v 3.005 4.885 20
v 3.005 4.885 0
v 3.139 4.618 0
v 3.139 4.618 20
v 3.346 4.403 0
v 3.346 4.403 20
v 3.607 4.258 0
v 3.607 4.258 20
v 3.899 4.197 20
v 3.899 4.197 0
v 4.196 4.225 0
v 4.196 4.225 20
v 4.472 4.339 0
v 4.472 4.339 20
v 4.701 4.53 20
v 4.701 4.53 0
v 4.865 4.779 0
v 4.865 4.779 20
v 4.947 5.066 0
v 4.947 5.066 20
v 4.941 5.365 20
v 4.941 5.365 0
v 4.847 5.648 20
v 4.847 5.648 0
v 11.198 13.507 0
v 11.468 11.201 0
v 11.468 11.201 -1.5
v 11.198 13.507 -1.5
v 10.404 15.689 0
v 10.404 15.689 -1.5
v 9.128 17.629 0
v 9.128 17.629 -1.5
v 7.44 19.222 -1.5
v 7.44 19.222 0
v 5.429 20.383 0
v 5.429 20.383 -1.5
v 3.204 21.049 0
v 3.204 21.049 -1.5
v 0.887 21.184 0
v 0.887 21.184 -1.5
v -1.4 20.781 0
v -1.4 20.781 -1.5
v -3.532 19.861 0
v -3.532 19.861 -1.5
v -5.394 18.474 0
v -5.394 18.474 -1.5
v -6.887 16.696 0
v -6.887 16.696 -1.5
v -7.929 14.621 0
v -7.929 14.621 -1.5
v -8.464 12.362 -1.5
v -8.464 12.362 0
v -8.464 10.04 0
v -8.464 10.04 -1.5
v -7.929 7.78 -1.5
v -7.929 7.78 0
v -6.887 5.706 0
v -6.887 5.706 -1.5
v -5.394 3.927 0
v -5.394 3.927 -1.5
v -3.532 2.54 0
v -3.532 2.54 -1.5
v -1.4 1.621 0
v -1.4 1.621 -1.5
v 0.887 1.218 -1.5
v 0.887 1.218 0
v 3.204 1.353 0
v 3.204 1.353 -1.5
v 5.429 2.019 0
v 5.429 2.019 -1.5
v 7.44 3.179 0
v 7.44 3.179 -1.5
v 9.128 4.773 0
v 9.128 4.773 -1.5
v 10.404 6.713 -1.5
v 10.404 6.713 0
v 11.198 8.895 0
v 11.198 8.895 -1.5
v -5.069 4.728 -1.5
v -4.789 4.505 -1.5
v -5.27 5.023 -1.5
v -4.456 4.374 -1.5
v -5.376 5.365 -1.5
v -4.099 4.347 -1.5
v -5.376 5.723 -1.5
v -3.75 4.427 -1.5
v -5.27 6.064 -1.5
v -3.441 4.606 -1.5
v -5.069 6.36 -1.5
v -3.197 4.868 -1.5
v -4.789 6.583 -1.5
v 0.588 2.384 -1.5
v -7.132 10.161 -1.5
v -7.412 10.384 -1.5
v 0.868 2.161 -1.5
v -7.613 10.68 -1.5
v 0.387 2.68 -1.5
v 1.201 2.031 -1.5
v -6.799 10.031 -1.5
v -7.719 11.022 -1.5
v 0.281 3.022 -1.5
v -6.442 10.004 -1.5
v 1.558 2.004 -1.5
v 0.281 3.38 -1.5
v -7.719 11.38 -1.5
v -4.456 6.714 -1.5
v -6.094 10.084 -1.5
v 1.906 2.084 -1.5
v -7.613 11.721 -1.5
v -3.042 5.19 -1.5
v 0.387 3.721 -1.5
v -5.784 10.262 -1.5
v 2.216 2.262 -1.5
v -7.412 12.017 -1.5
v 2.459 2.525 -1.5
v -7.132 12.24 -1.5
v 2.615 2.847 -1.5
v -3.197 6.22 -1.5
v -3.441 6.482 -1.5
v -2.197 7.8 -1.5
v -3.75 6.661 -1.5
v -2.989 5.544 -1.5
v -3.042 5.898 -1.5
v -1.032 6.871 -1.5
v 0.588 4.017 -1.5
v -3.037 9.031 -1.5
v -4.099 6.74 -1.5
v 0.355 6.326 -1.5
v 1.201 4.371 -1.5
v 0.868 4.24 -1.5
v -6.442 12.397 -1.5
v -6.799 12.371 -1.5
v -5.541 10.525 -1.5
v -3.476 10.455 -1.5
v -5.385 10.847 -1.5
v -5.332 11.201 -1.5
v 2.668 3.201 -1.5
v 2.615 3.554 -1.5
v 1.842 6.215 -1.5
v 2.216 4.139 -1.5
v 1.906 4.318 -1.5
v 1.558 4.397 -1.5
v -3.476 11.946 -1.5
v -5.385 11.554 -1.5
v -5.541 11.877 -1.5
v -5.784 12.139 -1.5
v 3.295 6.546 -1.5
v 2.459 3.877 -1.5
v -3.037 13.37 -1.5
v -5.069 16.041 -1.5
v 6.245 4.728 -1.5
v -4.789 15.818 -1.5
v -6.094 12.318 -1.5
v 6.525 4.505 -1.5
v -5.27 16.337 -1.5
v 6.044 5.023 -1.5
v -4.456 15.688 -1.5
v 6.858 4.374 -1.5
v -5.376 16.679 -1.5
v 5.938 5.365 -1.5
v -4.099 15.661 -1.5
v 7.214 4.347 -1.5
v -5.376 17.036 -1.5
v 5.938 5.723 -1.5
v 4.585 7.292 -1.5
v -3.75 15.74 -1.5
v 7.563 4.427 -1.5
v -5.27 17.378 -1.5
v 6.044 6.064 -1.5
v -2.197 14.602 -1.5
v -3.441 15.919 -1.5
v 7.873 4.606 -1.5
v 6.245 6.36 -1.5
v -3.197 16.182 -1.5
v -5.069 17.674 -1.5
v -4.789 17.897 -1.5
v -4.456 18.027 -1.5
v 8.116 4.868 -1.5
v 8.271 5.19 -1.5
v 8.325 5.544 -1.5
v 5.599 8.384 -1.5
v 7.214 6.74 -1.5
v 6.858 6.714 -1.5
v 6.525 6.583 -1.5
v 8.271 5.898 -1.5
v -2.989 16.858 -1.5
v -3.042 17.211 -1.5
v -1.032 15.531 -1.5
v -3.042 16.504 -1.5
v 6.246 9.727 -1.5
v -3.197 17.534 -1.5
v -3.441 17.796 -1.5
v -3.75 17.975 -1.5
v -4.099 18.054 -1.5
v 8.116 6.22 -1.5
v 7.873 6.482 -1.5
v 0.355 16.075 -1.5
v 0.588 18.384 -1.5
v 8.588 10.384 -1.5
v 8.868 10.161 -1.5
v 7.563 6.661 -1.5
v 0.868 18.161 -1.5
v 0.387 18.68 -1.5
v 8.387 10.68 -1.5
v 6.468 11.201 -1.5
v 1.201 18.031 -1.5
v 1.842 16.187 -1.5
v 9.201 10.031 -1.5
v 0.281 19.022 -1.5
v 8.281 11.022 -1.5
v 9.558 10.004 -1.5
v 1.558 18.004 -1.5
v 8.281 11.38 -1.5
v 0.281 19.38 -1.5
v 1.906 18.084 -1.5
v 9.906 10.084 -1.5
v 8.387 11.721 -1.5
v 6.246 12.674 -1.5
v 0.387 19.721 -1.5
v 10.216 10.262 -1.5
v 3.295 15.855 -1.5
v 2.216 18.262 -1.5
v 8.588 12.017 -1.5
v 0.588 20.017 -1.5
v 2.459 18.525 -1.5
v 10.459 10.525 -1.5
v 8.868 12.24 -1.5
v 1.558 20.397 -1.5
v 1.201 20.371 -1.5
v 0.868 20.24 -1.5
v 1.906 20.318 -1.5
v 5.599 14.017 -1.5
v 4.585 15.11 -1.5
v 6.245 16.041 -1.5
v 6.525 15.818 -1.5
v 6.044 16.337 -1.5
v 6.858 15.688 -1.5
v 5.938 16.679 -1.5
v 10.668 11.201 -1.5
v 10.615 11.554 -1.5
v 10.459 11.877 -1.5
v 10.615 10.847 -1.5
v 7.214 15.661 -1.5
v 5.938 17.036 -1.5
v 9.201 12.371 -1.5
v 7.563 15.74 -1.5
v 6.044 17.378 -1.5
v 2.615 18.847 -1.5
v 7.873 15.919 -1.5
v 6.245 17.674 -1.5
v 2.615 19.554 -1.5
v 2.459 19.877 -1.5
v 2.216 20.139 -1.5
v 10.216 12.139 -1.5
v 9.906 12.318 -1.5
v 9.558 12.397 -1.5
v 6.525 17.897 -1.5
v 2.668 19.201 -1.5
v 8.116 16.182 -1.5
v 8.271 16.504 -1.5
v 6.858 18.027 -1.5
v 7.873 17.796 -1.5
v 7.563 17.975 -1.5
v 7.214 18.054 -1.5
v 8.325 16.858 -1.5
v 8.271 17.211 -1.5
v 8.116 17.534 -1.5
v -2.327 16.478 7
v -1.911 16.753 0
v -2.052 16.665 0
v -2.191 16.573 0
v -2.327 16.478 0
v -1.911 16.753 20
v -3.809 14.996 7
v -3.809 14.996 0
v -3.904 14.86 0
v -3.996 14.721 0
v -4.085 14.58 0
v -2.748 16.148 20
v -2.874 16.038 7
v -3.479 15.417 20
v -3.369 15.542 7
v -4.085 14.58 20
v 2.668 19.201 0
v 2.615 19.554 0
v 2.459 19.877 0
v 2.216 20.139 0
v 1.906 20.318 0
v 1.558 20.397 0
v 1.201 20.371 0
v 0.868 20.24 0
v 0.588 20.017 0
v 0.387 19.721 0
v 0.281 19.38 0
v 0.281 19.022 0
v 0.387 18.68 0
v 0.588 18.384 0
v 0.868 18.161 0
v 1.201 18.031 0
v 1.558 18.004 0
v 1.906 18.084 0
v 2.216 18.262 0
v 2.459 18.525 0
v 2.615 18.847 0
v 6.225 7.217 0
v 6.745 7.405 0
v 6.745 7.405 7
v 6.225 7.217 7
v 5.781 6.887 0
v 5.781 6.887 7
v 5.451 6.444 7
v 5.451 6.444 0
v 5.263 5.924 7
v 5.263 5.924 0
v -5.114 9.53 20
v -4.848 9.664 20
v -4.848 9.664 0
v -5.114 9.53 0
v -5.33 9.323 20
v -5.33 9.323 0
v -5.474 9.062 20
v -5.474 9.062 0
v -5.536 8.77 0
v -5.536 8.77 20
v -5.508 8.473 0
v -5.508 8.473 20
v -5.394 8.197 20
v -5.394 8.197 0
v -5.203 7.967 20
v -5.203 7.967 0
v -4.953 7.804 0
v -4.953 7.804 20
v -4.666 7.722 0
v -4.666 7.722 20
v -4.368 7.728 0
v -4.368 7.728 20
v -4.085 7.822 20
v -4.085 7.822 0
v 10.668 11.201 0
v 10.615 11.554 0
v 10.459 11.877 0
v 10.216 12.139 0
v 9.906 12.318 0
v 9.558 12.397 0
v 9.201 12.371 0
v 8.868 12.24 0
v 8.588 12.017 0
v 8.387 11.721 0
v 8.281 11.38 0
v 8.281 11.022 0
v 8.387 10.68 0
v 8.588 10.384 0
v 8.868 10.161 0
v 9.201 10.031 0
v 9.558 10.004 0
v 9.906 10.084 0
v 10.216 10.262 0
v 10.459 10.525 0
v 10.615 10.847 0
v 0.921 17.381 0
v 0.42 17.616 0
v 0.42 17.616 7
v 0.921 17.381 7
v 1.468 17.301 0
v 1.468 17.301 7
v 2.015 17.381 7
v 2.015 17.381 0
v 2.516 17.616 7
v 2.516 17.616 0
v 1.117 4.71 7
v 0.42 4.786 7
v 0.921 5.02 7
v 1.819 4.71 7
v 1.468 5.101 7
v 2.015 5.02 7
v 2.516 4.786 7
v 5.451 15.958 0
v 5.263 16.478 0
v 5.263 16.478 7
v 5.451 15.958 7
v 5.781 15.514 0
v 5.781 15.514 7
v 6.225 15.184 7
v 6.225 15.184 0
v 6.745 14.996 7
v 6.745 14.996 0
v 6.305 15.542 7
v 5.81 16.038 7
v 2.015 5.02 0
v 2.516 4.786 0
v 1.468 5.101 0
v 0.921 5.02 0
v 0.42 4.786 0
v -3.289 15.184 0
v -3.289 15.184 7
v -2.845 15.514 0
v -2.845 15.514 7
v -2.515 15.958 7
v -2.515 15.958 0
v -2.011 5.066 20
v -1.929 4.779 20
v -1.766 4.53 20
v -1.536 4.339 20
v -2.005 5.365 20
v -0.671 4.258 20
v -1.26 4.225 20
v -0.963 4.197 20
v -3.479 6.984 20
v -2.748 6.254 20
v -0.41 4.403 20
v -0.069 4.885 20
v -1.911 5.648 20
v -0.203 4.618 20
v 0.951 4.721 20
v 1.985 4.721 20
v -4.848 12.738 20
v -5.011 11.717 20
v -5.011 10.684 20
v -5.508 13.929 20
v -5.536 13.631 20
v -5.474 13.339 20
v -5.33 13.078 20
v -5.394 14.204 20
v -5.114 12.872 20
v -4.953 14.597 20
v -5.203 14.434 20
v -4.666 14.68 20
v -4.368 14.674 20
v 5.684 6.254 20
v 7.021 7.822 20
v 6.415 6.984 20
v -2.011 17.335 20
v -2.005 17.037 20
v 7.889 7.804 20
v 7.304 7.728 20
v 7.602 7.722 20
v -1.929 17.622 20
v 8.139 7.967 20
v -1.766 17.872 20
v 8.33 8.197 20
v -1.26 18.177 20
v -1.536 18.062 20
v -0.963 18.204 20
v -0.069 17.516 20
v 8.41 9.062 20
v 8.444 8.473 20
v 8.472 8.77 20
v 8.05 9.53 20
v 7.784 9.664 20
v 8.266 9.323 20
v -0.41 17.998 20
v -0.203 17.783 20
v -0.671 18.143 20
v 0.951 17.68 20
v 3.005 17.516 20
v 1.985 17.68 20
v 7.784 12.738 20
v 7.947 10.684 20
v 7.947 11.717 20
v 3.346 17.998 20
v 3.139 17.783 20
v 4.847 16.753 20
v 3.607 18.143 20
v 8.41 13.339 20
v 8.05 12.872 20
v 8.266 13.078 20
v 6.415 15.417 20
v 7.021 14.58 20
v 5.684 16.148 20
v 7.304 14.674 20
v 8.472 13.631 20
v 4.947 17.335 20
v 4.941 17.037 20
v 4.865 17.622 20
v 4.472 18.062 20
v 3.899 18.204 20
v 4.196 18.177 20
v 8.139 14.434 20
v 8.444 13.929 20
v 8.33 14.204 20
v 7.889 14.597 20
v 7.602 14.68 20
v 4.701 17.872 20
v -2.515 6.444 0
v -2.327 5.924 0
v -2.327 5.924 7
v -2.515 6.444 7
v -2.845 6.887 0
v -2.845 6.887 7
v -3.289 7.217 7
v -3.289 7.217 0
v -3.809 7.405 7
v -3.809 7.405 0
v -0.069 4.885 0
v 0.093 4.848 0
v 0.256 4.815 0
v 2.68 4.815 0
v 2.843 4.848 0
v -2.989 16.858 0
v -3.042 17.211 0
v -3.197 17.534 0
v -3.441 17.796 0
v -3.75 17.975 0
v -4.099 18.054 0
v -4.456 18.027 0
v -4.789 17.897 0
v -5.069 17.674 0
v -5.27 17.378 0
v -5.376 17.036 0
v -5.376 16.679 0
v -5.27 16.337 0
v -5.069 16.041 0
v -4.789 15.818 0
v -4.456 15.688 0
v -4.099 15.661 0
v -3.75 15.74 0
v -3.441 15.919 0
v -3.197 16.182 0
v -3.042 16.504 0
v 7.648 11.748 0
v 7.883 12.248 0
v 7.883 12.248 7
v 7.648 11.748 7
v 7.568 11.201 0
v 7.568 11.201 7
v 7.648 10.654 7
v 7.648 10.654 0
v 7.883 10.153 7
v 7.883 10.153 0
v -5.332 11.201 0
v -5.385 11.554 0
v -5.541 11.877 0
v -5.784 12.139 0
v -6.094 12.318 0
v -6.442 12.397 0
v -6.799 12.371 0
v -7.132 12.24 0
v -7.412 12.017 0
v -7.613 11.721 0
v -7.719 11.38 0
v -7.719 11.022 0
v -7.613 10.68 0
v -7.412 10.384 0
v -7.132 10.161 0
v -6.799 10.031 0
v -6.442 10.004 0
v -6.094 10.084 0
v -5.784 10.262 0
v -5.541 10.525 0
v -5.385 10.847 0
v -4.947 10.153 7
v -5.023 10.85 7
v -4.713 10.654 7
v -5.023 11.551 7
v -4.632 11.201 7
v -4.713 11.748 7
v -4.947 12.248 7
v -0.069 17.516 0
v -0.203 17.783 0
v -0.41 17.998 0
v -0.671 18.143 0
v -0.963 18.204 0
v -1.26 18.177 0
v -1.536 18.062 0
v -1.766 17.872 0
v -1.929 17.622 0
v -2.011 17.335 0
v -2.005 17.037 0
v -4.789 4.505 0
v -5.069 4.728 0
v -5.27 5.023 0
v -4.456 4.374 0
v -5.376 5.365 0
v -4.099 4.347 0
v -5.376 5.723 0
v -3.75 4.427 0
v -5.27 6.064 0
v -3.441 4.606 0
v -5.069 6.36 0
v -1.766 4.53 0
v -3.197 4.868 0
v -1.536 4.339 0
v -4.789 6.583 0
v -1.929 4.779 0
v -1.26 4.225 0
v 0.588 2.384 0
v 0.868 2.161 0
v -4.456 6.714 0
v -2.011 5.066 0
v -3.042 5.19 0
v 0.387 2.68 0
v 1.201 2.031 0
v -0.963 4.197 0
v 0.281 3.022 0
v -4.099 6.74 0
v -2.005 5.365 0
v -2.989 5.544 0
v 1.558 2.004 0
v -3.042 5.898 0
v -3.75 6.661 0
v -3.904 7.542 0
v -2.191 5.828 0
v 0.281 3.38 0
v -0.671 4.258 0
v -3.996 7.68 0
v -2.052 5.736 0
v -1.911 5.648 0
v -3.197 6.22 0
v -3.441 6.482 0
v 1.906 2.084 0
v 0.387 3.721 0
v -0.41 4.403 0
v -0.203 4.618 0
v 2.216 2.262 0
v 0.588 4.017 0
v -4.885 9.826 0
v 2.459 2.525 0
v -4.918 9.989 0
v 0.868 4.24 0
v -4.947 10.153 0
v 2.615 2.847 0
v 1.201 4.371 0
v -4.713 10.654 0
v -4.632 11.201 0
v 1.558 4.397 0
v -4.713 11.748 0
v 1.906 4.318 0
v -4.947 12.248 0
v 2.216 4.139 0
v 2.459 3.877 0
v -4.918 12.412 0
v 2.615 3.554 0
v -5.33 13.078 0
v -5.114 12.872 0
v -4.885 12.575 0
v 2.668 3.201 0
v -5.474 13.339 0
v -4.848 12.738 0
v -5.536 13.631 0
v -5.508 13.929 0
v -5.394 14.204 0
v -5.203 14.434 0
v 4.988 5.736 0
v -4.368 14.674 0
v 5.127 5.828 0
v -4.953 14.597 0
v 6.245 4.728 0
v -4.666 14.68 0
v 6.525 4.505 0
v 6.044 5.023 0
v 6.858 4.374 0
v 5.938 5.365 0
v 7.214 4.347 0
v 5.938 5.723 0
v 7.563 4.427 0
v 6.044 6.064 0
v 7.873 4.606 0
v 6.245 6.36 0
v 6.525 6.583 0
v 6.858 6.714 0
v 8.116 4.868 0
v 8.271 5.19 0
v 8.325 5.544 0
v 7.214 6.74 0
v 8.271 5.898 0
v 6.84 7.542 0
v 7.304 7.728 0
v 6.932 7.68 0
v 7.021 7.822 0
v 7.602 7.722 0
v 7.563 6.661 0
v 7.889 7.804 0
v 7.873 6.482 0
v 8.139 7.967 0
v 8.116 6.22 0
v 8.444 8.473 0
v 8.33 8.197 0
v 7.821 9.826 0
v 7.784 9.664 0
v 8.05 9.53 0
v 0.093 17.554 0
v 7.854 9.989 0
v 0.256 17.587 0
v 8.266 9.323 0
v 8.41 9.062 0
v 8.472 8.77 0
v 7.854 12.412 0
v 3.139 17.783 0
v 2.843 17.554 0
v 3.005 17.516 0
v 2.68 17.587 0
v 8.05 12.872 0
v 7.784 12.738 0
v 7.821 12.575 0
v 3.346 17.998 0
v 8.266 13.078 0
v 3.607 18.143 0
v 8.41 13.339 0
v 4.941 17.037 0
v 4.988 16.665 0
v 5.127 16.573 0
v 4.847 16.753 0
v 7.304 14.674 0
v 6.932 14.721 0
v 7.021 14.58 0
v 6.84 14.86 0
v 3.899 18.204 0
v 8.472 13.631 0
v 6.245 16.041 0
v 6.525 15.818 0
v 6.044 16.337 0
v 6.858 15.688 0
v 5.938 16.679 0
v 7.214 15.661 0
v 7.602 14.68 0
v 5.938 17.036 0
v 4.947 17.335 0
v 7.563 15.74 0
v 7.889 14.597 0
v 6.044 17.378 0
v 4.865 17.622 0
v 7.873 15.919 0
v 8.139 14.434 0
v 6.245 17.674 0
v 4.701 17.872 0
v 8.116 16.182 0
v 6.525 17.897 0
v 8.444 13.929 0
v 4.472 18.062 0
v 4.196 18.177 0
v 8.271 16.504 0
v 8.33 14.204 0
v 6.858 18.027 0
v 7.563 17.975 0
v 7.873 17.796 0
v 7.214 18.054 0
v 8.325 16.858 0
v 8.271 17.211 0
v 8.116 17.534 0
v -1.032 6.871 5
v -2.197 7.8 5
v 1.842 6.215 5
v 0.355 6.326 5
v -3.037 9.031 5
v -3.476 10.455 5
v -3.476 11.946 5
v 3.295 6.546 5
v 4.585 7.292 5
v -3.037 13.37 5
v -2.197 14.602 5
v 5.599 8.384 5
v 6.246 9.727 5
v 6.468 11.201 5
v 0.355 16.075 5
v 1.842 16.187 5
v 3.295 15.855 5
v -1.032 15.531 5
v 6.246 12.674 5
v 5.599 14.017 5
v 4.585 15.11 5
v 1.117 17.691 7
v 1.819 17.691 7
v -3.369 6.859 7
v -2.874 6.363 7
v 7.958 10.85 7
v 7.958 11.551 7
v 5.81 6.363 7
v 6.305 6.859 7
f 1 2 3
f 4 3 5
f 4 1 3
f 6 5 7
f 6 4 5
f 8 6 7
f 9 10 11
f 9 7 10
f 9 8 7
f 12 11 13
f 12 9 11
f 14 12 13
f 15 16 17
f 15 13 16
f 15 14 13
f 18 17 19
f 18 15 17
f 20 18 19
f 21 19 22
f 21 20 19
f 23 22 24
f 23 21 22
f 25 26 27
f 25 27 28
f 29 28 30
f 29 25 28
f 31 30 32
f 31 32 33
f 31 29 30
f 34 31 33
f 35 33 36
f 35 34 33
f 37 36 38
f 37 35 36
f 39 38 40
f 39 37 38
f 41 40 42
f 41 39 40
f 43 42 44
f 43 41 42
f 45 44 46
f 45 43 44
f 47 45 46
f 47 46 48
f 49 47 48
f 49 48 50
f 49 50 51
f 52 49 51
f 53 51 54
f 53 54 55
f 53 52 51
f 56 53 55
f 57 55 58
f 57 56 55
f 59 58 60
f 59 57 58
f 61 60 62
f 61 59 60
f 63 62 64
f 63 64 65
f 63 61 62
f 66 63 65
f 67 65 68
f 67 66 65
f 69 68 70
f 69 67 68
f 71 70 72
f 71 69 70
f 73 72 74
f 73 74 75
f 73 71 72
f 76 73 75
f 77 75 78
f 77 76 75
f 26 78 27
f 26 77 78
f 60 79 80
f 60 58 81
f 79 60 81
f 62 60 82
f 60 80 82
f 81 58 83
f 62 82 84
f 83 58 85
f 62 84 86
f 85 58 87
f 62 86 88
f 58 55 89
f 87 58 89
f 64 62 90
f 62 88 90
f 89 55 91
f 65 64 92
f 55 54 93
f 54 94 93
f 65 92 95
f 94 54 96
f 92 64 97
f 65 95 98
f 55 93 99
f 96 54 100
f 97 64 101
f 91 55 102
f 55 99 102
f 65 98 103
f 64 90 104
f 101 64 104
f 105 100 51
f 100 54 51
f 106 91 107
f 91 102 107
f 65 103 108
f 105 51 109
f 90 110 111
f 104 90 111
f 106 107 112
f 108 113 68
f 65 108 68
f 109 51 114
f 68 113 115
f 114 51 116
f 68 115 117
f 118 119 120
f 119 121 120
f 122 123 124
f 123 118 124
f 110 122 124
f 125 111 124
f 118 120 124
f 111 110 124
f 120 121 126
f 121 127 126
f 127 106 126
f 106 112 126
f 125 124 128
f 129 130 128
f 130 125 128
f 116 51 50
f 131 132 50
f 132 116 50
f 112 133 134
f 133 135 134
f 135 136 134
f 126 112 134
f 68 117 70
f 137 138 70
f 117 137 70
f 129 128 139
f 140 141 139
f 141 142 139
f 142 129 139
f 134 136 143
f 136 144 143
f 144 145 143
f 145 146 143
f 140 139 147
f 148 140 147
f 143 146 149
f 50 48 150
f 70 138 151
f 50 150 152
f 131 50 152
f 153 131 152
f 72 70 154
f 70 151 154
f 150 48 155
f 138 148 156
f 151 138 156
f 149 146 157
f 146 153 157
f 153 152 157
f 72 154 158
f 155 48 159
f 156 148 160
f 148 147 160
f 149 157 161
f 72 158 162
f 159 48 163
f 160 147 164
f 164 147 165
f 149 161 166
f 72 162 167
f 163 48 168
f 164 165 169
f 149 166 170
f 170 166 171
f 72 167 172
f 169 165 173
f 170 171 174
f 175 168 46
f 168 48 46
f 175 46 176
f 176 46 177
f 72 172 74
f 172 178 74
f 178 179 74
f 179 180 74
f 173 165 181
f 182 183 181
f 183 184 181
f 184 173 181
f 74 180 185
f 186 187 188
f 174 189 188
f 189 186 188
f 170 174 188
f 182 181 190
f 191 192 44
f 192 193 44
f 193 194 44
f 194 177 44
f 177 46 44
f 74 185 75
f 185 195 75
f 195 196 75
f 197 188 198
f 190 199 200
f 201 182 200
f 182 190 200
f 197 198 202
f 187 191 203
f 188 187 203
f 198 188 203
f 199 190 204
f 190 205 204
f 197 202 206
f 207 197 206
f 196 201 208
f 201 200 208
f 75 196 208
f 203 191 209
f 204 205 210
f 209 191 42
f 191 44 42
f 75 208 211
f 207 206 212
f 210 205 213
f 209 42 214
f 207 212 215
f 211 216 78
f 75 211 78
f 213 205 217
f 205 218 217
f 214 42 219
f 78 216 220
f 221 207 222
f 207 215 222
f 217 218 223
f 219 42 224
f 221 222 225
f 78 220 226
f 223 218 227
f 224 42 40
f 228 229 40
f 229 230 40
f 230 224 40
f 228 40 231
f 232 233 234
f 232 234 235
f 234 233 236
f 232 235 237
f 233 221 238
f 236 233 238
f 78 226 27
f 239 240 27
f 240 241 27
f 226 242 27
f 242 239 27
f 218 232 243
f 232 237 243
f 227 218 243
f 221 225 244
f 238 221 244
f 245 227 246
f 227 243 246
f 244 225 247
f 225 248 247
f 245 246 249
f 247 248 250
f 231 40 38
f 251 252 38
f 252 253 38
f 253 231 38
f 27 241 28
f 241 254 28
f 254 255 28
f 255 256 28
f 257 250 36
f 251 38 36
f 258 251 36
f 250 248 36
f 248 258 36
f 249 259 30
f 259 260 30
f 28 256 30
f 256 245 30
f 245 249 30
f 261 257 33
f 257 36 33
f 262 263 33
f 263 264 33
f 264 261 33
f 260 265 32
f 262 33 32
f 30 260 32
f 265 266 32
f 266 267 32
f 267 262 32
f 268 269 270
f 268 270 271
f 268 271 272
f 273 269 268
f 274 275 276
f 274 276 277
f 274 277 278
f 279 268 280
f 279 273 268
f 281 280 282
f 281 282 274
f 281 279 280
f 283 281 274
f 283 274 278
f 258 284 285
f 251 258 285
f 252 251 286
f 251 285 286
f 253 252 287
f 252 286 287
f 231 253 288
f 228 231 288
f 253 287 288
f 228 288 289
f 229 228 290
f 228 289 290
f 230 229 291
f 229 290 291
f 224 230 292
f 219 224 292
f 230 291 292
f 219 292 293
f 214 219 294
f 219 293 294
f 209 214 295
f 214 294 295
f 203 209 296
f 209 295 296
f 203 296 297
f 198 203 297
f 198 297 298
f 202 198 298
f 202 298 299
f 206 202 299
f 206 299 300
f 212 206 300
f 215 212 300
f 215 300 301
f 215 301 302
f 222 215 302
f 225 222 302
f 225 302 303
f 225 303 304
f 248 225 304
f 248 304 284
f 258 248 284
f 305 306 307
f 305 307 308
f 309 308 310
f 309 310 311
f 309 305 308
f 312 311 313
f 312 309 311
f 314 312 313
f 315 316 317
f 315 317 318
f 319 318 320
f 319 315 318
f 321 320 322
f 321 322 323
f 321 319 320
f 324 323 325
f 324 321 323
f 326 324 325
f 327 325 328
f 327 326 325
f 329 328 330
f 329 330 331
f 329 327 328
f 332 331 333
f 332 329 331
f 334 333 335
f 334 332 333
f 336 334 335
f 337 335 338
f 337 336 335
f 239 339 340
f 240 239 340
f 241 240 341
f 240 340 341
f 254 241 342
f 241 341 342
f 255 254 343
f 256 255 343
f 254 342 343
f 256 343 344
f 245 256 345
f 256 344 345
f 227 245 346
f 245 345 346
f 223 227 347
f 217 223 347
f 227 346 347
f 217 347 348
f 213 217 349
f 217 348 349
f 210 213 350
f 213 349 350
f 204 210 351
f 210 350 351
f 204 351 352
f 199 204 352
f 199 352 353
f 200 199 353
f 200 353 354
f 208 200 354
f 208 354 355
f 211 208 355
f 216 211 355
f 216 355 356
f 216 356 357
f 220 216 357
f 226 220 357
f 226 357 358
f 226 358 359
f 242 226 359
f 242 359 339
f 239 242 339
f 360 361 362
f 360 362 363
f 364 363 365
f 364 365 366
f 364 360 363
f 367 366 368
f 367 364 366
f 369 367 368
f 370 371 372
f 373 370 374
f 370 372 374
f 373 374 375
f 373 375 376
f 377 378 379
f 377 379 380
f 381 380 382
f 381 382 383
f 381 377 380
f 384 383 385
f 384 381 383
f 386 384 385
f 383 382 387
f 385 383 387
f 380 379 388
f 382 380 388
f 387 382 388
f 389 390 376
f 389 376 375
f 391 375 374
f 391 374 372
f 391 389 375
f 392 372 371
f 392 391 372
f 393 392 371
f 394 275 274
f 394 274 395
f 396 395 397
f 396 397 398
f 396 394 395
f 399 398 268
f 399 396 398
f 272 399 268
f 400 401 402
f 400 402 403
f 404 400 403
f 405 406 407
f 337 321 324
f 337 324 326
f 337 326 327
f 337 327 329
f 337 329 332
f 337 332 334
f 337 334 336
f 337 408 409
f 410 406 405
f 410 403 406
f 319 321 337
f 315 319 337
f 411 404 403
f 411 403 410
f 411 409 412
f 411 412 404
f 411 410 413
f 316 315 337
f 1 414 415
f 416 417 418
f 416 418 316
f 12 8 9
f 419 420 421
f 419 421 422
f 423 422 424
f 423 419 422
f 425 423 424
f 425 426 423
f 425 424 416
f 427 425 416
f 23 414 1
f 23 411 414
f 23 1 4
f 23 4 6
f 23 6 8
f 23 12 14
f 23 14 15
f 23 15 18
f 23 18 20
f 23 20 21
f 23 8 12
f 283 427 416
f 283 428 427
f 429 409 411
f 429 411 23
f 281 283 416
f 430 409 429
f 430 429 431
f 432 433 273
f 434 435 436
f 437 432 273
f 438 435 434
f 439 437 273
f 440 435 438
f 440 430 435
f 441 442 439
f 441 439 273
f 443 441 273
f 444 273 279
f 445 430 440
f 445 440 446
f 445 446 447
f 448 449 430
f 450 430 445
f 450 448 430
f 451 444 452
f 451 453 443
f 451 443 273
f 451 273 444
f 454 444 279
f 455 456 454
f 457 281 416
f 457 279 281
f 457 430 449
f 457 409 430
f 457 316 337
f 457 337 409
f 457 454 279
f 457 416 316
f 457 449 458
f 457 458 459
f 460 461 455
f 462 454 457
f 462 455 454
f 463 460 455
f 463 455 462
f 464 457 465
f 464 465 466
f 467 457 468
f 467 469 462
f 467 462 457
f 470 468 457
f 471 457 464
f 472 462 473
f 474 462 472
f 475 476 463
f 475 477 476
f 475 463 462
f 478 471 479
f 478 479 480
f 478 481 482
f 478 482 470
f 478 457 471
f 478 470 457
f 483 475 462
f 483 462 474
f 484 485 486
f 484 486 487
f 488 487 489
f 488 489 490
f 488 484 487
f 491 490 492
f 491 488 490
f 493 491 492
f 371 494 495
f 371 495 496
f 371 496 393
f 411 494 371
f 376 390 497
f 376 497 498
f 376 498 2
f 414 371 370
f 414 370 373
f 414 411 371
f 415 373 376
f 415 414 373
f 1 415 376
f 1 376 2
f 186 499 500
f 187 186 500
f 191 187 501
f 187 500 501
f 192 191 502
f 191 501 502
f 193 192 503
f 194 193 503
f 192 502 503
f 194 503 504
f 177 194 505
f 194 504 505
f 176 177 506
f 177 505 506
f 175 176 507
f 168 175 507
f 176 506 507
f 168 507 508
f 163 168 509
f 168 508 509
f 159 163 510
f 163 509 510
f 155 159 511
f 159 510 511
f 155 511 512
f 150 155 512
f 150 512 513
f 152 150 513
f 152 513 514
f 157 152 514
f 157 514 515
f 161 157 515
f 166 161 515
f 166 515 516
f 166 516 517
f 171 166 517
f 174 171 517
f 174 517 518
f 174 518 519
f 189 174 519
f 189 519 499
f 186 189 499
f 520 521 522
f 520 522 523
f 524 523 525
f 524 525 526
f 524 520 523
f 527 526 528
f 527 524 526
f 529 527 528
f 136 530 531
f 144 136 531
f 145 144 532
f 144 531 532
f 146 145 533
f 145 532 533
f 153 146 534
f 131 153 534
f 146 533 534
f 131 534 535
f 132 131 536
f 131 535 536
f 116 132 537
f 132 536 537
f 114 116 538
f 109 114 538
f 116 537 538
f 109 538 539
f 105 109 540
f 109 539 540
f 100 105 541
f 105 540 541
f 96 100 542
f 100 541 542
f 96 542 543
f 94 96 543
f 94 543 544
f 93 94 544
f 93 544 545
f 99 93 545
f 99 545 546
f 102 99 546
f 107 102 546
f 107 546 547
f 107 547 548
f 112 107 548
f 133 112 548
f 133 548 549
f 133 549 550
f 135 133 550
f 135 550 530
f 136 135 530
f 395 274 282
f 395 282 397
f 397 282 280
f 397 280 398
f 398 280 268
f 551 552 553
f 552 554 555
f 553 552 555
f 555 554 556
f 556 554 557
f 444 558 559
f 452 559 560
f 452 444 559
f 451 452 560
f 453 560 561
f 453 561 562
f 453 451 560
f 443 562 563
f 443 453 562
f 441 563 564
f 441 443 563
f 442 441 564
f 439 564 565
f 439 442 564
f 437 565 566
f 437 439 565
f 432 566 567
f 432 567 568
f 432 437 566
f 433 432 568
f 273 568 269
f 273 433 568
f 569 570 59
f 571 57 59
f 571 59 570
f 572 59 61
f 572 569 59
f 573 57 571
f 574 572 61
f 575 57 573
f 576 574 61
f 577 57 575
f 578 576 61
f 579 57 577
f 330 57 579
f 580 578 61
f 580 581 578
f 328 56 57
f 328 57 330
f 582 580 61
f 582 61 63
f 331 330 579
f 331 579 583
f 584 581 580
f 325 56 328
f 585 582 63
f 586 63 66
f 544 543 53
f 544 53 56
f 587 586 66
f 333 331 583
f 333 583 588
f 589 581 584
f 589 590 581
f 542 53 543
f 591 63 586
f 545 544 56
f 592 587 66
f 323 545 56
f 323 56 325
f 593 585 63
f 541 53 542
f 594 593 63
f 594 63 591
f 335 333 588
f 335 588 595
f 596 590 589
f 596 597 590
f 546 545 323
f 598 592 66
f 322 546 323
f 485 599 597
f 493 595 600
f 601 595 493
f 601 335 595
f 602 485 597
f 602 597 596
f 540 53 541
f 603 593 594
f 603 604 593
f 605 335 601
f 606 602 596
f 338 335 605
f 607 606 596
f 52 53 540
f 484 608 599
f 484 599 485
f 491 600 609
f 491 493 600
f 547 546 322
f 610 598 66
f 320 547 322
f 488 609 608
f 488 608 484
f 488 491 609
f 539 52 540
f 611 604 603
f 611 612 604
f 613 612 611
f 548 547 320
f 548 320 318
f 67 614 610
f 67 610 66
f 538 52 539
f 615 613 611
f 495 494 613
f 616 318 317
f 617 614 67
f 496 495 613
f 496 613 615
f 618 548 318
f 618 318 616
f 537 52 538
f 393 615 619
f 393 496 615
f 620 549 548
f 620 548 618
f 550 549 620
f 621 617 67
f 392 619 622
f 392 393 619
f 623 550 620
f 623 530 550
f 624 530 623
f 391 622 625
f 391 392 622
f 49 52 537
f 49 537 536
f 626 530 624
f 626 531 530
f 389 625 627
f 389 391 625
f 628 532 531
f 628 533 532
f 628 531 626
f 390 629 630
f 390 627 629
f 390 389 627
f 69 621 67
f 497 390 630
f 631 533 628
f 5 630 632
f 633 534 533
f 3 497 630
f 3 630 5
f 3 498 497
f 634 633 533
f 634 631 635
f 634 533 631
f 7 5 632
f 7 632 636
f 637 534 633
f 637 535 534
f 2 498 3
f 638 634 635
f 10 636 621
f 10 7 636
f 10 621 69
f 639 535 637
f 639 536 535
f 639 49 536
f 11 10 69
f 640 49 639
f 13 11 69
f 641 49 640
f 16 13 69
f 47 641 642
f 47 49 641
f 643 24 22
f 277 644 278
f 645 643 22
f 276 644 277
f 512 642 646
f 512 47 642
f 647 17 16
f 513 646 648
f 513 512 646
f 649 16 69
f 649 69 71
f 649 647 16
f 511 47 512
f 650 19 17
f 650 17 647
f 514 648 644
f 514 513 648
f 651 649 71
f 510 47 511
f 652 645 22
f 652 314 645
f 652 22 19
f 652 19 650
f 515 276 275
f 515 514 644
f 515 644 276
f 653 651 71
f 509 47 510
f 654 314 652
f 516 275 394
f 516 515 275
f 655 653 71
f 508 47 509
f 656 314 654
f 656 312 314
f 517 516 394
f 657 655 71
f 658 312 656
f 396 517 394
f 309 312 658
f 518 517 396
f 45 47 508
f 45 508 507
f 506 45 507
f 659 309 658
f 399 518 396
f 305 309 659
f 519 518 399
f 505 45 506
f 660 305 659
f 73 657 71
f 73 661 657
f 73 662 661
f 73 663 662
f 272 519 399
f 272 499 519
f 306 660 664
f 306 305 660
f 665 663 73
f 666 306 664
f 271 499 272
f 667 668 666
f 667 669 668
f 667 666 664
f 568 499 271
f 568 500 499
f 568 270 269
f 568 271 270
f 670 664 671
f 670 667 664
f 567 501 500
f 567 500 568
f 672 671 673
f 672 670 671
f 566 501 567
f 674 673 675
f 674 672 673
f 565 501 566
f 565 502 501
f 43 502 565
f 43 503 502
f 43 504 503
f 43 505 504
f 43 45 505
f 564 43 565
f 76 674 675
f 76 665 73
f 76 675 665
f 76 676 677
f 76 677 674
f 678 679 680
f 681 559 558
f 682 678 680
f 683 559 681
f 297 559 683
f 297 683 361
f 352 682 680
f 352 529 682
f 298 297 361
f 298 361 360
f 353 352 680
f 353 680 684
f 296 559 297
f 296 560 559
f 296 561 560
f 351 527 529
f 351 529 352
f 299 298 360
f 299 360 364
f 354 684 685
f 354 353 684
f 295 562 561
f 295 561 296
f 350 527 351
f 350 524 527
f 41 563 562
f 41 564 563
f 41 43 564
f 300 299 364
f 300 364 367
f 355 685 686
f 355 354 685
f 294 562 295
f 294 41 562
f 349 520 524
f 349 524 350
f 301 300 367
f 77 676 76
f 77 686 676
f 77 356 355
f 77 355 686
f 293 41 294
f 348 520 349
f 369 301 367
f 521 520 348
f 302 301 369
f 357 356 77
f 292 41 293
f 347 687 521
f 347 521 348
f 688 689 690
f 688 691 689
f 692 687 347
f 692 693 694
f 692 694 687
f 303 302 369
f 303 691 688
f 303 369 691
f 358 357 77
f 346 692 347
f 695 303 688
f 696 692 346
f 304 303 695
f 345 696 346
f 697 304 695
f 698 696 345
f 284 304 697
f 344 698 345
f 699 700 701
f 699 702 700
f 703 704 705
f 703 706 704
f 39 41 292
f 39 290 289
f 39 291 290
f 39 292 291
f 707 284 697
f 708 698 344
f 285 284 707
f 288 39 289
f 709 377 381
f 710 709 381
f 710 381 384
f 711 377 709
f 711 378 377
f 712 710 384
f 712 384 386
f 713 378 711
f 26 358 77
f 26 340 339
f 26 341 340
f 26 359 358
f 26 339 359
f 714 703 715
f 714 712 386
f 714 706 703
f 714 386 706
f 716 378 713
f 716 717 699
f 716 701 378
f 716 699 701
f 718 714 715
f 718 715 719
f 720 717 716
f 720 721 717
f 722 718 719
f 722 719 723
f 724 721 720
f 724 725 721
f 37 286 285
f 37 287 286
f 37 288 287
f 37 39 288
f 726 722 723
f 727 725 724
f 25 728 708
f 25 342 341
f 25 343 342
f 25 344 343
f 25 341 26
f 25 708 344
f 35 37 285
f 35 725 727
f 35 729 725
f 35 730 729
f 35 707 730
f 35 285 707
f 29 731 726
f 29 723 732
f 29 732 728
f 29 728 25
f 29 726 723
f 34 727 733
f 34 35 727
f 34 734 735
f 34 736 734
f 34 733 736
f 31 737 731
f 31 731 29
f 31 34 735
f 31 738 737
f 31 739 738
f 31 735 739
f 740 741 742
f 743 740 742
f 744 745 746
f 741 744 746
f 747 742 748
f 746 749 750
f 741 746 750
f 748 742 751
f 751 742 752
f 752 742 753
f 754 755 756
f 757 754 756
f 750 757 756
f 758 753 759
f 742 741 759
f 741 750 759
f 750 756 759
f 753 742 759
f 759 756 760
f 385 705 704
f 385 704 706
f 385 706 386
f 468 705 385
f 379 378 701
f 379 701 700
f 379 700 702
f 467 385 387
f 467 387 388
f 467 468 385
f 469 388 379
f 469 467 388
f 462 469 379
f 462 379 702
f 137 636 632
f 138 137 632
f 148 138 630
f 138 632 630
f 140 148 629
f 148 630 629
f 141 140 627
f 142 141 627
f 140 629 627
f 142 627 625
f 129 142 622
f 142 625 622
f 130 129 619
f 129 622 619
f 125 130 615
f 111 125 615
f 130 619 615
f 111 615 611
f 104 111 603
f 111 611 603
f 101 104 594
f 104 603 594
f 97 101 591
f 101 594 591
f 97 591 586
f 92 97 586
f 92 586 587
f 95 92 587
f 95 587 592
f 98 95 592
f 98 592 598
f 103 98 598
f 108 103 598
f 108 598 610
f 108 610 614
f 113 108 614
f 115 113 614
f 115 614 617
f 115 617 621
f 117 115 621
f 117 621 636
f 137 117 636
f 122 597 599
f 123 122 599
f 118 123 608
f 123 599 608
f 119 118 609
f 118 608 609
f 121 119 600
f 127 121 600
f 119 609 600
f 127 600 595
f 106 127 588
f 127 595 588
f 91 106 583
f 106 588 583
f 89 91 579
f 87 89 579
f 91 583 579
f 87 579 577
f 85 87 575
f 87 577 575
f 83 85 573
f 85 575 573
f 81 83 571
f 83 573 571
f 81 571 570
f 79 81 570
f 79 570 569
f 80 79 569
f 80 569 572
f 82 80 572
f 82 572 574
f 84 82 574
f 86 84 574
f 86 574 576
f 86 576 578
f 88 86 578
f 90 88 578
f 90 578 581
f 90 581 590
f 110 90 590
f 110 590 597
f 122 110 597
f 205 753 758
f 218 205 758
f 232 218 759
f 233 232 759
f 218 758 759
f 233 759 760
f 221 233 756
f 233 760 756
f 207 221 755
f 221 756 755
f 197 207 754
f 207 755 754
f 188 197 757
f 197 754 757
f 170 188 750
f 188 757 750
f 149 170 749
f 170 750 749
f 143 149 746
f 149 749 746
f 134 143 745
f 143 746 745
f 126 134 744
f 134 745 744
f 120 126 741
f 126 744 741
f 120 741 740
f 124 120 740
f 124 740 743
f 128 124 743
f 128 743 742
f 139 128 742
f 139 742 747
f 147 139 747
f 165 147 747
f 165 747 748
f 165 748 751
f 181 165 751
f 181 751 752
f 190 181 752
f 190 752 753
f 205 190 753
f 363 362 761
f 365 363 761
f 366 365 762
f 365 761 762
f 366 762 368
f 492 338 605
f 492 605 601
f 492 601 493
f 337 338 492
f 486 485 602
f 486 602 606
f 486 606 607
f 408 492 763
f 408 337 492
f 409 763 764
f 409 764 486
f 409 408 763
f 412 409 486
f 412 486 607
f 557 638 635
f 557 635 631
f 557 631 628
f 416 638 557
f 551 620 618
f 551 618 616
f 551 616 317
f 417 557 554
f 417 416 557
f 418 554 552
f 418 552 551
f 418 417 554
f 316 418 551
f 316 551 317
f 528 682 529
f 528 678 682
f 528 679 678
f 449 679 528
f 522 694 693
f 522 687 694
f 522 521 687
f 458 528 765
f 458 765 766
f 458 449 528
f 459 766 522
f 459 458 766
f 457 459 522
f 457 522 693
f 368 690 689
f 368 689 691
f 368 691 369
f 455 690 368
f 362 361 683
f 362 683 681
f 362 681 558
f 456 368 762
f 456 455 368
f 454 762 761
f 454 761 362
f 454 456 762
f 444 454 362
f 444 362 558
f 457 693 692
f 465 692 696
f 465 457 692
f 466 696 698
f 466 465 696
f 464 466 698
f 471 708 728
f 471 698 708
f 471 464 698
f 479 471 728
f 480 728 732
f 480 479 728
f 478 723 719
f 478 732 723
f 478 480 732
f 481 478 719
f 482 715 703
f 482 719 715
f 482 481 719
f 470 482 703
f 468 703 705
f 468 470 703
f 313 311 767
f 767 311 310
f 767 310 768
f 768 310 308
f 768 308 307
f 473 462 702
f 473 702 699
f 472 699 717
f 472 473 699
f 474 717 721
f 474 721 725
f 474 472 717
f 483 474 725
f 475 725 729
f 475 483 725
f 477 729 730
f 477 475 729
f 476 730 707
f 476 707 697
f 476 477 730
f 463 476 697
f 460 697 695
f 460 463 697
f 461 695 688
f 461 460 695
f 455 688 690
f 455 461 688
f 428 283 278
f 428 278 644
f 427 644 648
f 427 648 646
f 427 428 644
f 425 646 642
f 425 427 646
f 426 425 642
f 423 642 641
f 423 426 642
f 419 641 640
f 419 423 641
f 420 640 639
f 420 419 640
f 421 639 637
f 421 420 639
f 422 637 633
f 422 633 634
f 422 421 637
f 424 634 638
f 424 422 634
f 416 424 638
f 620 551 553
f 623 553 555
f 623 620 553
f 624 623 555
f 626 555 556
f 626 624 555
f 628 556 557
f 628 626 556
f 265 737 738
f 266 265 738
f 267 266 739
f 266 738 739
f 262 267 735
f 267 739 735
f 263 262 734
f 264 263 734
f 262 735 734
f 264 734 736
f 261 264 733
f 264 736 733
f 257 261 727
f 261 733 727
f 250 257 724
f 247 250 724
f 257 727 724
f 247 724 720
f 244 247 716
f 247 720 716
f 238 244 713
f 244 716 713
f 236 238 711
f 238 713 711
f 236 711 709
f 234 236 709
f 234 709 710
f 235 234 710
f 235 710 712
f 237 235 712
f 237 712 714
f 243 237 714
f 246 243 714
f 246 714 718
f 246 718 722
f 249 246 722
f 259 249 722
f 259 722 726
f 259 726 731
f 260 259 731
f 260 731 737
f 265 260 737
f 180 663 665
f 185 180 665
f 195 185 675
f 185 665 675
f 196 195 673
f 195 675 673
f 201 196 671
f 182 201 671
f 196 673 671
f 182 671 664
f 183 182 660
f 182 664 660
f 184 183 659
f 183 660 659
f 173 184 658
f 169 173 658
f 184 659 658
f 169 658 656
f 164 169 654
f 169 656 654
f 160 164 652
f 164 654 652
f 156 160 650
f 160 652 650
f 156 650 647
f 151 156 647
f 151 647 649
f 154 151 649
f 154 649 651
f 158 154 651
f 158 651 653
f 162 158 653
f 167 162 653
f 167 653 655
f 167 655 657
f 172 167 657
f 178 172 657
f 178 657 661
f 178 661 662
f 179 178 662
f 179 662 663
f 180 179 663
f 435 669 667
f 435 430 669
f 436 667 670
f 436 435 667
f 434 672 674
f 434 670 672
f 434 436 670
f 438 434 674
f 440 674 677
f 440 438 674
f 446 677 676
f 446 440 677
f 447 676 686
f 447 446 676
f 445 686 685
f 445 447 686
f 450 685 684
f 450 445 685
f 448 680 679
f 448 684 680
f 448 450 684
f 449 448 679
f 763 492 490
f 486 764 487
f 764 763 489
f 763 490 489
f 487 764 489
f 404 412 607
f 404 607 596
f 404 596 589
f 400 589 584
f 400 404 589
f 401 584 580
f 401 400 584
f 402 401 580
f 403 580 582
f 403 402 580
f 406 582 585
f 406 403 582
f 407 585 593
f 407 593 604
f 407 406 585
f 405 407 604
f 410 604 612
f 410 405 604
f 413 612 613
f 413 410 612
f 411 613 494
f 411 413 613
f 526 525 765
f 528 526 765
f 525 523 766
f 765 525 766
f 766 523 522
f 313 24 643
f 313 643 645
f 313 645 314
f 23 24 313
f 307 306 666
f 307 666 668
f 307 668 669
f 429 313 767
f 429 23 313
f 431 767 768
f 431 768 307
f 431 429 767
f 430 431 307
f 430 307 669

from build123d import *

# Parameters (mm, degrees)
CROQUIS1_R              = 10
CROQUIS1_R_2            = 5
SALIENTE_EXTRUIR1_DEPTH = 1.5
CORTAR_EXTRUIR1_REACH   = 26.15
CROQUIS2_R              = 1.2
SALIENTE_EXTRUIR2_START = 20
CROQUIS3_R              = 6.5
CROQUIS3_R_2            = 5
SALIENTE_EXTRUIR2_DEPTH = 20
CROQUIS5_R              = 1
SALIENTE_EXTRUIR3_DEPTH = 20
CROQUIS7_R              = 1.9
CORTAR_EXTRUIR3_DEPTH   = 7
CROQUIS8_R              = 6
SALIENTE_EXTRUIR4_DEPTH = 15


with BuildPart() as part:
    # Croquis1 → Saliente-Extruir1 (new body)
    with BuildSketch(Plane.XY):
        with Locations((1.467948917, 11.200668728)):
            Circle(CROQUIS1_R)
        with Locations((1.467948917, 11.200668728)):
            Circle(CROQUIS1_R_2, mode=Mode.SUBTRACT)
    extrude(amount=-SALIENTE_EXTRUIR1_DEPTH)

    # Croquis2 → Cortar-Extruir1 (cut, up to next)
    with BuildSketch(Plane.XY, mode=Mode.PRIVATE) as cortar_extruir1_sk1:
        with Locations((1.467948917, 19.200668728)):
            Circle(CROQUIS2_R)
    cortar_extruir1_tool1 = extrude(cortar_extruir1_sk1.sketch, amount=-CORTAR_EXTRUIR1_REACH, mode=Mode.PRIVATE) & part.part
    # Croquis2 → Cortar-Extruir1 (cut, up to next)
    with BuildSketch(Plane.XY, mode=Mode.PRIVATE) as cortar_extruir1_sk2:
        with Locations((7.124803167, 16.857522978)):
            Circle(CROQUIS2_R)
    cortar_extruir1_tool2 = extrude(cortar_extruir1_sk2.sketch, amount=-CORTAR_EXTRUIR1_REACH, mode=Mode.PRIVATE) & part.part
    # Croquis2 → Cortar-Extruir1 (cut, up to next)
    with BuildSketch(Plane.XY, mode=Mode.PRIVATE) as cortar_extruir1_sk3:
        with Locations((9.467948917, 11.200668728)):
            Circle(CROQUIS2_R)
    cortar_extruir1_tool3 = extrude(cortar_extruir1_sk3.sketch, amount=-CORTAR_EXTRUIR1_REACH, mode=Mode.PRIVATE) & part.part
    # Croquis2 → Cortar-Extruir1 (cut, up to next)
    with BuildSketch(Plane.XY, mode=Mode.PRIVATE) as cortar_extruir1_sk4:
        with Locations((7.124803167, 5.543814479)):
            Circle(CROQUIS2_R)
    cortar_extruir1_tool4 = extrude(cortar_extruir1_sk4.sketch, amount=-CORTAR_EXTRUIR1_REACH, mode=Mode.PRIVATE) & part.part
    # Croquis2 → Cortar-Extruir1 (cut, up to next)
    with BuildSketch(Plane.XY, mode=Mode.PRIVATE) as cortar_extruir1_sk5:
        with Locations((1.467948917, 3.200668728)):
            Circle(CROQUIS2_R)
    cortar_extruir1_tool5 = extrude(cortar_extruir1_sk5.sketch, amount=-CORTAR_EXTRUIR1_REACH, mode=Mode.PRIVATE) & part.part
    # Croquis2 → Cortar-Extruir1 (cut, up to next)
    with BuildSketch(Plane.XY, mode=Mode.PRIVATE) as cortar_extruir1_sk6:
        with Locations((-4.188905332, 5.543814479)):
            Circle(CROQUIS2_R)
    cortar_extruir1_tool6 = extrude(cortar_extruir1_sk6.sketch, amount=-CORTAR_EXTRUIR1_REACH, mode=Mode.PRIVATE) & part.part
    # Croquis2 → Cortar-Extruir1 (cut, up to next)
    with BuildSketch(Plane.XY, mode=Mode.PRIVATE) as cortar_extruir1_sk7:
        with Locations((-6.532051083, 11.200668728)):
            Circle(CROQUIS2_R)
    cortar_extruir1_tool7 = extrude(cortar_extruir1_sk7.sketch, amount=-CORTAR_EXTRUIR1_REACH, mode=Mode.PRIVATE) & part.part
    # Croquis2 → Cortar-Extruir1 (cut, up to next)
    with BuildSketch(Plane.XY, mode=Mode.PRIVATE) as cortar_extruir1_sk8:
        with Locations((-4.188905332, 16.857522978)):
            Circle(CROQUIS2_R)
    cortar_extruir1_tool8 = extrude(cortar_extruir1_sk8.sketch, amount=-CORTAR_EXTRUIR1_REACH, mode=Mode.PRIVATE) & part.part
    add(cortar_extruir1_tool1.solids().sort_by_distance((1.467949, 19.200669, 0))[0], mode=Mode.SUBTRACT)
    add(cortar_extruir1_tool2.solids().sort_by_distance((7.124803, 16.857523, 0))[0], mode=Mode.SUBTRACT)
    add(cortar_extruir1_tool3.solids().sort_by_distance((9.467949, 11.200669, 0))[0], mode=Mode.SUBTRACT)
    add(cortar_extruir1_tool4.solids().sort_by_distance((7.124803, 5.543814, 0))[0], mode=Mode.SUBTRACT)
    add(cortar_extruir1_tool5.solids().sort_by_distance((1.467949, 3.200669, 0))[0], mode=Mode.SUBTRACT)
    add(cortar_extruir1_tool6.solids().sort_by_distance((-4.188905, 5.543814, 0))[0], mode=Mode.SUBTRACT)
    add(cortar_extruir1_tool7.solids().sort_by_distance((-6.532051, 11.200669, 0))[0], mode=Mode.SUBTRACT)
    add(cortar_extruir1_tool8.solids().sort_by_distance((-4.188905, 16.857523, 0))[0], mode=Mode.SUBTRACT)

    # Croquis3 → Saliente-Extruir2 (add)
    with BuildSketch(Plane.XY.offset(SALIENTE_EXTRUIR2_START)):
        with Locations((1.467948917, 11.200668728)):
            Circle(CROQUIS3_R)
        with Locations((1.467948917, 11.200668728)):
            Circle(CROQUIS3_R_2, mode=Mode.SUBTRACT)
    extrude(amount=-SALIENTE_EXTRUIR2_DEPTH)

    # Croquis5 → Saliente-Extruir3 (add)
    with BuildSketch(Plane.XY.offset(20)):
        with Locations((3.955391227, 17.20588569)):
            Circle(CROQUIS5_R)
        with Locations((7.473165878, 13.688111039)):
            Circle(CROQUIS5_R)
        with Locations((7.473165878, 8.713226418)):
            Circle(CROQUIS5_R)
        with Locations((3.955391227, 5.195451767)):
            Circle(CROQUIS5_R)
        with Locations((-1.019493393, 5.195451767)):
            Circle(CROQUIS5_R)
        with Locations((-4.537268044, 8.713226418)):
            Circle(CROQUIS5_R)
        with Locations((-4.537268044, 13.688111039)):
            Circle(CROQUIS5_R)
        with Locations((-1.019493393, 17.20588569)):
            Circle(CROQUIS5_R)
    extrude(amount=-SALIENTE_EXTRUIR3_DEPTH)

    # Croquis7 → Cortar-Extruir3 (cut)
    with BuildSketch(Plane.XY):
        with Locations((-4.188905332, 16.857522978)):
            Circle(CROQUIS7_R)
        with Locations((1.467948917, 19.200668728)):
            Circle(CROQUIS7_R)
        with Locations((7.124803167, 16.857522978)):
            Circle(CROQUIS7_R)
        with Locations((9.467948917, 11.200668728)):
            Circle(CROQUIS7_R)
        with Locations((7.124803167, 5.543814479)):
            Circle(CROQUIS7_R)
        with Locations((1.467948917, 3.200668728)):
            Circle(CROQUIS7_R)
        with Locations((-4.188905332, 5.543814479)):
            Circle(CROQUIS7_R)
        with Locations((-6.532051083, 11.200668728)):
            Circle(CROQUIS7_R)
    extrude(amount=CORTAR_EXTRUIR3_DEPTH, mode=Mode.SUBTRACT)

    # Croquis8 → Saliente-Extruir4 (add)
    with BuildSketch(Plane.XY.offset(20)):
        with Locations((1.467948917, 11.200668728)):
            Circle(CROQUIS8_R)
    extrude(amount=-SALIENTE_EXTRUIR4_DEPTH)


solid = part.part
